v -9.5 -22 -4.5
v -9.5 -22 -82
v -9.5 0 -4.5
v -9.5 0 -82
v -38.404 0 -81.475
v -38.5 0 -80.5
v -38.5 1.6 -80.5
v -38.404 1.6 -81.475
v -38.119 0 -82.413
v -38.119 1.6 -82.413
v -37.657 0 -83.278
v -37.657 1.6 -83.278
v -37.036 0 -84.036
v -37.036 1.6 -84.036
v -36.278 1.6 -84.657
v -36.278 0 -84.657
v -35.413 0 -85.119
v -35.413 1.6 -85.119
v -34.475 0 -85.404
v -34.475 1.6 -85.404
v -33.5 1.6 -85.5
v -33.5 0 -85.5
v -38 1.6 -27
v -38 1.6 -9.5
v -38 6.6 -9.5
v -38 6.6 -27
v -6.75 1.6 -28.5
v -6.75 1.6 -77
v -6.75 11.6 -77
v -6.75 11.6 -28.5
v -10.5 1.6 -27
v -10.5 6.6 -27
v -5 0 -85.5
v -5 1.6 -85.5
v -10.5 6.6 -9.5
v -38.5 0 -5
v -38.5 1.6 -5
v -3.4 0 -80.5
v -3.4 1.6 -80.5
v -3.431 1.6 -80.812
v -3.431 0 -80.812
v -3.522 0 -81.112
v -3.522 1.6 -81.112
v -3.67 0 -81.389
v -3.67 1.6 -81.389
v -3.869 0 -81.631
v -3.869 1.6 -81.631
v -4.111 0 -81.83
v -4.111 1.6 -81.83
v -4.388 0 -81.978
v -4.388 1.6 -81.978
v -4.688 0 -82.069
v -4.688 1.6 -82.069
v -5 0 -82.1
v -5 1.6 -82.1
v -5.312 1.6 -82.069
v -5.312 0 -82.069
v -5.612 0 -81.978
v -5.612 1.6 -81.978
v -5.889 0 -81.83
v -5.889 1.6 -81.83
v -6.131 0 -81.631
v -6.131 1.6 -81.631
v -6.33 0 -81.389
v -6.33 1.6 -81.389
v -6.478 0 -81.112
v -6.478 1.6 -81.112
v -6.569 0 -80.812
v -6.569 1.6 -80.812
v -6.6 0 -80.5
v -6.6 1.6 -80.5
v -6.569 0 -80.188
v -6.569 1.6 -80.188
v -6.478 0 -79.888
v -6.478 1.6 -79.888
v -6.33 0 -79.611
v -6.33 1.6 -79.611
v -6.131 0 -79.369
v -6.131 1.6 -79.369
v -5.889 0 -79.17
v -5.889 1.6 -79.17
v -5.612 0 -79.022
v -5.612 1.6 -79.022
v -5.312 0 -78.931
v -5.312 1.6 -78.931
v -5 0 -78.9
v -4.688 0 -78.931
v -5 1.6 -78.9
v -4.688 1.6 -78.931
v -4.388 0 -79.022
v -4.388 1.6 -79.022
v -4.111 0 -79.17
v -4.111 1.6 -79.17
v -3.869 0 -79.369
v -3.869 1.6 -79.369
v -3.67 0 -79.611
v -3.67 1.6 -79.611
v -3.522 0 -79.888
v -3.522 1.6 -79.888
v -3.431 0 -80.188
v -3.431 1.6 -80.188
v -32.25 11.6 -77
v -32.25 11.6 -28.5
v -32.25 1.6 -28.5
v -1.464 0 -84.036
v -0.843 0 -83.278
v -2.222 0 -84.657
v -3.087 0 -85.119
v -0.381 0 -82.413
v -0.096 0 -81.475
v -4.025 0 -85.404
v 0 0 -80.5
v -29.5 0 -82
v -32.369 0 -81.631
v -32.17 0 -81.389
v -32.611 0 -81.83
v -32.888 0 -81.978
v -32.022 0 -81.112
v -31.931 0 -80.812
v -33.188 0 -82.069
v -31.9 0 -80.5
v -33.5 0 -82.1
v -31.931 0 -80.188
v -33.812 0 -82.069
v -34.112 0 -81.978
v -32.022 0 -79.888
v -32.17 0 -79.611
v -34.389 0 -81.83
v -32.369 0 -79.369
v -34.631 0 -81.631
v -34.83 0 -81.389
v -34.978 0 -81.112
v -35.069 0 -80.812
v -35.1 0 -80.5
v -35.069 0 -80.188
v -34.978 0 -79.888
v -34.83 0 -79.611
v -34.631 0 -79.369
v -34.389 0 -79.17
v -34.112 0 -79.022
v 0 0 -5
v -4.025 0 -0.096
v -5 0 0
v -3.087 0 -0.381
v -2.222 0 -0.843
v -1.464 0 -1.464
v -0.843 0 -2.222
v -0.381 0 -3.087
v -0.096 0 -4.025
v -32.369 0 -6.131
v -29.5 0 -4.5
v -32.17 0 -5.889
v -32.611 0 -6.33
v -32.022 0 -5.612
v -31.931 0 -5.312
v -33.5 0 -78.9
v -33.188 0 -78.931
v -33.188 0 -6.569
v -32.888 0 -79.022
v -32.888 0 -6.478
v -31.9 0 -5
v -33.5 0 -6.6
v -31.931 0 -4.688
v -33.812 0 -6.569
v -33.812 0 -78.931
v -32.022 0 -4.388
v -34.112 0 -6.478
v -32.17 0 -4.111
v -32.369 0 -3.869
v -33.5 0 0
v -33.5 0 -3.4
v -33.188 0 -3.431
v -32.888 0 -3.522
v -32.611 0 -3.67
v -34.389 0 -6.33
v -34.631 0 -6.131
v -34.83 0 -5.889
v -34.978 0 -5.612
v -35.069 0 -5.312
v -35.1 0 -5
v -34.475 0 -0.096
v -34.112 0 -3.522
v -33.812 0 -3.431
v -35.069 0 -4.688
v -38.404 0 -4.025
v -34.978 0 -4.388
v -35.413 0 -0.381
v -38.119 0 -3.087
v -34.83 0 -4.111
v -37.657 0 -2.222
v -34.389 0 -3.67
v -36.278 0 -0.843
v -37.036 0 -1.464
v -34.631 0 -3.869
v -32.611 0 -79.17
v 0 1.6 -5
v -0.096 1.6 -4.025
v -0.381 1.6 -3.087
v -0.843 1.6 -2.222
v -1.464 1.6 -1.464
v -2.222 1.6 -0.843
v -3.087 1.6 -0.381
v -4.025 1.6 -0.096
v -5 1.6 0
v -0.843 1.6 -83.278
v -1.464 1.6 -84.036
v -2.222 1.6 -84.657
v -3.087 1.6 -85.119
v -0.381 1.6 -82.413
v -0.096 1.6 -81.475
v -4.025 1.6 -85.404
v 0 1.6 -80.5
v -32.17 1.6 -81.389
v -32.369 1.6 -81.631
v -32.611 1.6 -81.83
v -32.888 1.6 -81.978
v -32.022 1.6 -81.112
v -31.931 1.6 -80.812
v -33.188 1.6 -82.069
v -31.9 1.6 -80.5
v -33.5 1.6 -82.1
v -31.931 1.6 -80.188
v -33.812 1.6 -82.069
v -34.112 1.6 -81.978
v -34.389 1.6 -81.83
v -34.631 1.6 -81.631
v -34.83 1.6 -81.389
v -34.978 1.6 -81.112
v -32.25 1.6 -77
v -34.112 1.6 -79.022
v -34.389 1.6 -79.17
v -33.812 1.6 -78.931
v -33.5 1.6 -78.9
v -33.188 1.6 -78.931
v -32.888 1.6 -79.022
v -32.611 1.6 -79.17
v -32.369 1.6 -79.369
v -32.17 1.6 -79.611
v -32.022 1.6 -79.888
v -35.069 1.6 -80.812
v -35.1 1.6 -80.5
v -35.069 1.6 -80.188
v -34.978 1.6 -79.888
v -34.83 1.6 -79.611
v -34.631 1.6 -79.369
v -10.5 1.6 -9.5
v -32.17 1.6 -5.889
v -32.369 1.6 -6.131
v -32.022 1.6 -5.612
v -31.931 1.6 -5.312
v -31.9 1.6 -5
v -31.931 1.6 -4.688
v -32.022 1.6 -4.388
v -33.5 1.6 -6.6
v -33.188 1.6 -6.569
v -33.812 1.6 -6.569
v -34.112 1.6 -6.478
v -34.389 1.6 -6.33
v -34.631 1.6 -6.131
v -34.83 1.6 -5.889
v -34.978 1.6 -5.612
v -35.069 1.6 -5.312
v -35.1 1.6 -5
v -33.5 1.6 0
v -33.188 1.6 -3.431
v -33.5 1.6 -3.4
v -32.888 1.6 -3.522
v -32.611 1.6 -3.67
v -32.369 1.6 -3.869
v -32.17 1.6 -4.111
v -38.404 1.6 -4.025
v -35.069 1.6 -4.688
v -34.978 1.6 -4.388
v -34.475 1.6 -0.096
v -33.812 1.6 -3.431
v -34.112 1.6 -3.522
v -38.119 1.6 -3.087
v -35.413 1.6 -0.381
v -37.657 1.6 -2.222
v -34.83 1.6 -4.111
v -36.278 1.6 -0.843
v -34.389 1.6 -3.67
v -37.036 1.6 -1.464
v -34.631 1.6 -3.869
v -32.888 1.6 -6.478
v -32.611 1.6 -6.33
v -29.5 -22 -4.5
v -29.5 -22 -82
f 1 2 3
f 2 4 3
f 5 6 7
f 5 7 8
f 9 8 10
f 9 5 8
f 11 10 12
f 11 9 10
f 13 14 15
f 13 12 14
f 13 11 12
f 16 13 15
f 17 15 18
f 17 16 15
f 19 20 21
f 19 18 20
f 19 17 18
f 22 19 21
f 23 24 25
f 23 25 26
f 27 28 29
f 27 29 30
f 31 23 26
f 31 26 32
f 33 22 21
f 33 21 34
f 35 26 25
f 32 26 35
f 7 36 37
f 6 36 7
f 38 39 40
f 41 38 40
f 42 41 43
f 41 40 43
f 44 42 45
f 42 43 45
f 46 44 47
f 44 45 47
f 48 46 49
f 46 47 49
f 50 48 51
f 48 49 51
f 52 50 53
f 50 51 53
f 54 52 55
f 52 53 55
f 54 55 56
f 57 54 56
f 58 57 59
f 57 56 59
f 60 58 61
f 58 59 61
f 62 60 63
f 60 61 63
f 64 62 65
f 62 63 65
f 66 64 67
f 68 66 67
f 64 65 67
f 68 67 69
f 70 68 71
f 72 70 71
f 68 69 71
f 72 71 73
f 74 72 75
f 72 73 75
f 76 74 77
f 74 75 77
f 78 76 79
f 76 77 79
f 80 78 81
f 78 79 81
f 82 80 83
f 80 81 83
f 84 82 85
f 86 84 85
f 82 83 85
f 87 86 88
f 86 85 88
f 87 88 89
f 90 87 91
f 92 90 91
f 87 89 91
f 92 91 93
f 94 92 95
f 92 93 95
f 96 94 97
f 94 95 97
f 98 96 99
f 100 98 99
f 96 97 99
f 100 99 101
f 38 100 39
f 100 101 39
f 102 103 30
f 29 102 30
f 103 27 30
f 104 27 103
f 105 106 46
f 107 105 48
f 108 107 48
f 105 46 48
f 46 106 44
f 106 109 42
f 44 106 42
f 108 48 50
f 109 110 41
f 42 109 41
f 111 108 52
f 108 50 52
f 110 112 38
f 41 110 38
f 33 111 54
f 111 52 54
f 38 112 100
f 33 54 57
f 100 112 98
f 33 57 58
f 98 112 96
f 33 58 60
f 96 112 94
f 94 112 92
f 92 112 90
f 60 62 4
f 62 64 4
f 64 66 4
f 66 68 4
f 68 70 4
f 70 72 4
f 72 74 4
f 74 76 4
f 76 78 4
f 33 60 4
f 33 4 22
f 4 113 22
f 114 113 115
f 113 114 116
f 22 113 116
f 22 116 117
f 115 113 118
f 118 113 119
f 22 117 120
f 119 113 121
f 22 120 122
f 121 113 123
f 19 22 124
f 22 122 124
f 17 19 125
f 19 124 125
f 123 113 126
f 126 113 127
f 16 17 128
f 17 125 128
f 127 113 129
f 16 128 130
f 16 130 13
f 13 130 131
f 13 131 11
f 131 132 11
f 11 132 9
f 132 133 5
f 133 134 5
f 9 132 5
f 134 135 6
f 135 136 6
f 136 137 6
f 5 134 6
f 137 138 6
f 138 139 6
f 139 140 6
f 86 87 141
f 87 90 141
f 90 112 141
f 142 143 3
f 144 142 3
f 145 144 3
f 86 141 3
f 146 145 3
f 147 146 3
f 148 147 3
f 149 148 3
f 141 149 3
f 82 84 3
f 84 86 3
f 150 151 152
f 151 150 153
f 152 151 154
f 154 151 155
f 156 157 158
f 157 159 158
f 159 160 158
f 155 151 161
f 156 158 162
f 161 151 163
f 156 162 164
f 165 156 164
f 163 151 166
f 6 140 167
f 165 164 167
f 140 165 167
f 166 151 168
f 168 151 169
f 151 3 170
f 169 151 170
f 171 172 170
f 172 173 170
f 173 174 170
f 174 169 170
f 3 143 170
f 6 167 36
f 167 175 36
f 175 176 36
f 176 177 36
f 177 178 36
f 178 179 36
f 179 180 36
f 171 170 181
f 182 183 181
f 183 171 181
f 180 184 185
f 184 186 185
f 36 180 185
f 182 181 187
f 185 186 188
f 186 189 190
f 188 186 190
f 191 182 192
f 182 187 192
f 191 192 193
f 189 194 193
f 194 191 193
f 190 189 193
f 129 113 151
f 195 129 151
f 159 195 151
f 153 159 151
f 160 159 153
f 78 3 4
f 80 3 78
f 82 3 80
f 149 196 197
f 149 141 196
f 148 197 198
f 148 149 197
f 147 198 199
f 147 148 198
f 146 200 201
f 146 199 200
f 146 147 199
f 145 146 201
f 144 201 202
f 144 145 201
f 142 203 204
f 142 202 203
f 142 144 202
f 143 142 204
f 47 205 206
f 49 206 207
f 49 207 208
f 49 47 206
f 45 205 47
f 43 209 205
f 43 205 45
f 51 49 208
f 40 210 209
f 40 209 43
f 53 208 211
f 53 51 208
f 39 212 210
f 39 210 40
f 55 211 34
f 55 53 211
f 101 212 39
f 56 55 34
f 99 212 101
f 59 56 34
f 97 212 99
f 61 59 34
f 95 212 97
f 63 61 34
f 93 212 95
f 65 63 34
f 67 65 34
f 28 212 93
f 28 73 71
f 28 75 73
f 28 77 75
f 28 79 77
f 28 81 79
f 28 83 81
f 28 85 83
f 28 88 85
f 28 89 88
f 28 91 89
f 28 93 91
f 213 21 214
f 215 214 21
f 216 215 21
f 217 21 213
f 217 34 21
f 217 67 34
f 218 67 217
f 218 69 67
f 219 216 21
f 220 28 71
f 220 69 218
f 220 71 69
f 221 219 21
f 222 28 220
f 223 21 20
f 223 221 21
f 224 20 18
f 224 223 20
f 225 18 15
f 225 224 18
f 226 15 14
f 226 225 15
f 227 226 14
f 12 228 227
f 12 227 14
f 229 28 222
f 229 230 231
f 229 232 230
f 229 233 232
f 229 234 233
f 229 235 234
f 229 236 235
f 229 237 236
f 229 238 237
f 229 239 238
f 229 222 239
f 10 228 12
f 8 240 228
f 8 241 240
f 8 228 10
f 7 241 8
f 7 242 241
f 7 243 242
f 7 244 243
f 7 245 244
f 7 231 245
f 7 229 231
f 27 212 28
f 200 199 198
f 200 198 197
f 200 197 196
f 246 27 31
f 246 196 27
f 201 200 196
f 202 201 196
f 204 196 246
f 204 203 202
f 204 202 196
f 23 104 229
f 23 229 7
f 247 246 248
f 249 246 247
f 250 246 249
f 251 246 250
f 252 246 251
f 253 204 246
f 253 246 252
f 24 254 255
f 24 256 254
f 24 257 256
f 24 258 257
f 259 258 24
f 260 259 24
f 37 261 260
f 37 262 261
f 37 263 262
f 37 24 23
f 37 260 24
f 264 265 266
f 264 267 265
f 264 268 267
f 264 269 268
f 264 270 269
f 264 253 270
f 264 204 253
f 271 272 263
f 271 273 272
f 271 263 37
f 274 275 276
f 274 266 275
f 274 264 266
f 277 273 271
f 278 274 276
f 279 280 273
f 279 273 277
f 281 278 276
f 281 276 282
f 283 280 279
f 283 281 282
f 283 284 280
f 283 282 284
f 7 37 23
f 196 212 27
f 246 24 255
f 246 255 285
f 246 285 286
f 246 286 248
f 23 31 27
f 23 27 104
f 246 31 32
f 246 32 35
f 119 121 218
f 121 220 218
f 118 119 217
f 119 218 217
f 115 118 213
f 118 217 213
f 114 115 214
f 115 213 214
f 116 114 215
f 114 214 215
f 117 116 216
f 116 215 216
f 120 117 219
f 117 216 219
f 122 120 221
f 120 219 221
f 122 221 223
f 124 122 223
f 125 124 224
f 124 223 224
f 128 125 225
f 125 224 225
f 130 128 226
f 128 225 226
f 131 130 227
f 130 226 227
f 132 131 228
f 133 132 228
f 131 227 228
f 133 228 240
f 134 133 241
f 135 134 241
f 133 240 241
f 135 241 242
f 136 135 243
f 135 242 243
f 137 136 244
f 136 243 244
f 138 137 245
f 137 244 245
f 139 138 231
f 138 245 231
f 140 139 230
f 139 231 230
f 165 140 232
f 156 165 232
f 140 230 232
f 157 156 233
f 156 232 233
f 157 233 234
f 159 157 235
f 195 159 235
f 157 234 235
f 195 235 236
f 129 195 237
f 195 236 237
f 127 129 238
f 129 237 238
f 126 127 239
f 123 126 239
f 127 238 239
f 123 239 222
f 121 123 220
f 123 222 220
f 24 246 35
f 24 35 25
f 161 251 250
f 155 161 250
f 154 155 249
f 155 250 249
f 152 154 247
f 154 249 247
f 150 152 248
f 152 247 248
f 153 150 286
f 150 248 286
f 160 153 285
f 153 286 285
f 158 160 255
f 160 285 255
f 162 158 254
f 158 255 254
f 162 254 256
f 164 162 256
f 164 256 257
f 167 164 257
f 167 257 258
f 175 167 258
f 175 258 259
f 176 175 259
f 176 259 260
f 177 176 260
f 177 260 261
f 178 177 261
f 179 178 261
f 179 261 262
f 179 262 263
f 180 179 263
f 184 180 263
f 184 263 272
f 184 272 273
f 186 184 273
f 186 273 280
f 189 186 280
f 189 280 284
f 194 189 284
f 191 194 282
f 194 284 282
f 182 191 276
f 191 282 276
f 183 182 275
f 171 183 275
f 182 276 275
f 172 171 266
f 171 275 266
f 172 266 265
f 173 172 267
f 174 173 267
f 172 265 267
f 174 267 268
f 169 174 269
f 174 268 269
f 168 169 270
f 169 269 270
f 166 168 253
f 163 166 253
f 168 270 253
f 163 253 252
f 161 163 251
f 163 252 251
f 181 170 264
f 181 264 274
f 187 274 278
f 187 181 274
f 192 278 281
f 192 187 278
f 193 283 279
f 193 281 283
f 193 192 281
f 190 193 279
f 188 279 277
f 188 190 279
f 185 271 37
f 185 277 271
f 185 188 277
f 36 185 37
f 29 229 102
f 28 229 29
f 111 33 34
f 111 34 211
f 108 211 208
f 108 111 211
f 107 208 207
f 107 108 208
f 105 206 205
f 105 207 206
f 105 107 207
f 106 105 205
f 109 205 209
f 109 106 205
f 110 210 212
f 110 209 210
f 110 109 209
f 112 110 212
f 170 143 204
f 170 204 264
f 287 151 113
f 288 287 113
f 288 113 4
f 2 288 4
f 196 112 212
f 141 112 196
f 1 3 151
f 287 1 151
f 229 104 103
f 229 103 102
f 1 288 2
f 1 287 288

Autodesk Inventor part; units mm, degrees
ref_plane "YZ Plane" through (0, 0, 0) normal (1, 0, 0) x (0, 1, 0)
ref_plane "XZ Plane" through (0, 0, 0) normal (0, 1, 0) x (-1, 0, 0)
ref_plane "XY Plane" through (0, 0, 0) normal (0, 0, 1) x (1, 0, 0)
sketch "Sketch1" plane through (0, 0, 0) normal (0, 1, 0) x (-1, 0, 0)
  line L0 (5, 0) -> (33.5, 0)
  line L1 (38.5, -5) -> (38.5, -80.5)
  line L2 (33.5, -85.5) -> (5, -85.5)
  line L3 (0, -80.5) -> (0, -5)
  arc A0 (38.5, -5) -> (33.5, 0) centre (33.5, -5) ccw
  arc A1 (33.5, -85.5) -> (38.5, -80.5) centre (33.5, -80.5) ccw
  arc A2 (0, -80.5) -> (5, -85.5) centre (5, -80.5) ccw
  arc A3 (5, 0) -> (0, -5) centre (5, -5) ccw
  point P0 (0, 0)
  point P1 (38.5, -85.5)
  point P2 (38.5, 0)
  point P3 (0, -85.5)
  dimension "d0" = 38.5
  dimension "d1" = 85.5
  dimension "d2" = 5
  dimension "d3" = 5
  dimension "d4" = 5
  dimension "d5" = 5
extrude "Extrusion1" add sketch "Sketch1" along normal blind 1.6
sketch "Sketch2" plane through (0, 1.6, 0) normal (0, 1, 0) x (1, 0, 0)
  arc A0 (-5, 0) -> (0, 5) centre (-5, 5) ccw projected
  arc A1 (0, 80.5) -> (-5, 85.5) centre (-5, 80.5) ccw projected
  circle A2 centre (-5, 80.5) radius 1.6
  arc A3 (-33.5, 85.5) -> (-38.5, 80.5) centre (-33.5, 80.5) ccw projected
  circle A4 centre (-33.5, 80.5) radius 1.6
  arc A5 (-38.5, 5) -> (-33.5, 0) centre (-33.5, 5) ccw projected
  circle A6 centre (-33.5, 5) radius 1.6
  point P0 (0, 0)
  dimension "d9" = 3.2
  dimension "d10" = 3.2
  dimension "d11" = 3.2
extrude "Extrusion2" cut sketch "Sketch2" against normal blind 35
sketch "Sketch4" plane through (0, 0, 0) normal (0, -1, 0) x (1, 0, 0)
  line L0 (0, 0) -> (-9.5, 0)
  line L1 (-9.5, 0) -> (-9.5, -4.5)
  line L2 (-9.5, -4.5) -> (0, -4.5)
  line L3 (0, -4.5) -> (0, 0)
  line L4 (-9.5, -4.5) -> (-29.5, -4.5)
  line L5 (-29.5, -4.5) -> (-29.5, -82)
  line L6 (-29.5, -82) -> (-9.5, -82)
  line L7 (-9.5, -82) -> (-9.5, -4.5)
  dimension "d14" = 9.5
  dimension "d15" = 4.5
  dimension "d16" = 20
  dimension "d17" = 77.5
extrude "Extrusion3" add sketch "Sketch4" along normal blind 22 contours L7 L6 L5 L4
sketch "Sketch5" plane through (0, 1.6, 0) normal (0, 1, 0) x (1, 0, 0)
  line L0 (0, 0) -> (-10.5, 0)
  line L1 (-10.5, 0) -> (-10.5, 9.5)
  line L2 (-10.5, 9.5) -> (0, 9.5)
  line L3 (0, 9.5) -> (0, 0)
  line L4 (-10.5, 9.5) -> (-38, 9.5)
  line L5 (-38, 9.5) -> (-38, 27)
  line L6 (-38, 27) -> (-10.5, 27)
  line L7 (-10.5, 27) -> (-10.5, 9.5)
  dimension "d20" = 10.5
  dimension "d21" = 9.5
  dimension "d22" = 27.5
  dimension "d23" = 17.5
extrude "Extrusion4" add sketch "Sketch5" along normal blind 5 contours L4 L5 L6 L7
sketch "Sketch6" plane through (0, 1.6, 0) normal (0, 1, 0) x (1, 0, 0)
  line L0 (0, 0) -> (-6.75, 0)
  line L1 (-6.75, 0) -> (-6.75, 28.5)
  line L2 (-6.75, 28.5) -> (0, 28.5)
  line L3 (0, 28.5) -> (0, 0)
  line L4 (-6.75, 28.5) -> (-32.25, 28.5)
  line L5 (-32.25, 28.5) -> (-32.25, 77)
  line L6 (-32.25, 77) -> (-6.75, 77)
  line L7 (-6.75, 77) -> (-6.75, 28.5)
  dimension "d26" = 6.75
  dimension "d27" = 28.5
  dimension "d28" = 25.5
  dimension "d29" = 48.5
extrude "Extrusion5" add sketch "Sketch6" along normal blind 10 contours L4 L5 L6 L7
properties part number "PCB"
